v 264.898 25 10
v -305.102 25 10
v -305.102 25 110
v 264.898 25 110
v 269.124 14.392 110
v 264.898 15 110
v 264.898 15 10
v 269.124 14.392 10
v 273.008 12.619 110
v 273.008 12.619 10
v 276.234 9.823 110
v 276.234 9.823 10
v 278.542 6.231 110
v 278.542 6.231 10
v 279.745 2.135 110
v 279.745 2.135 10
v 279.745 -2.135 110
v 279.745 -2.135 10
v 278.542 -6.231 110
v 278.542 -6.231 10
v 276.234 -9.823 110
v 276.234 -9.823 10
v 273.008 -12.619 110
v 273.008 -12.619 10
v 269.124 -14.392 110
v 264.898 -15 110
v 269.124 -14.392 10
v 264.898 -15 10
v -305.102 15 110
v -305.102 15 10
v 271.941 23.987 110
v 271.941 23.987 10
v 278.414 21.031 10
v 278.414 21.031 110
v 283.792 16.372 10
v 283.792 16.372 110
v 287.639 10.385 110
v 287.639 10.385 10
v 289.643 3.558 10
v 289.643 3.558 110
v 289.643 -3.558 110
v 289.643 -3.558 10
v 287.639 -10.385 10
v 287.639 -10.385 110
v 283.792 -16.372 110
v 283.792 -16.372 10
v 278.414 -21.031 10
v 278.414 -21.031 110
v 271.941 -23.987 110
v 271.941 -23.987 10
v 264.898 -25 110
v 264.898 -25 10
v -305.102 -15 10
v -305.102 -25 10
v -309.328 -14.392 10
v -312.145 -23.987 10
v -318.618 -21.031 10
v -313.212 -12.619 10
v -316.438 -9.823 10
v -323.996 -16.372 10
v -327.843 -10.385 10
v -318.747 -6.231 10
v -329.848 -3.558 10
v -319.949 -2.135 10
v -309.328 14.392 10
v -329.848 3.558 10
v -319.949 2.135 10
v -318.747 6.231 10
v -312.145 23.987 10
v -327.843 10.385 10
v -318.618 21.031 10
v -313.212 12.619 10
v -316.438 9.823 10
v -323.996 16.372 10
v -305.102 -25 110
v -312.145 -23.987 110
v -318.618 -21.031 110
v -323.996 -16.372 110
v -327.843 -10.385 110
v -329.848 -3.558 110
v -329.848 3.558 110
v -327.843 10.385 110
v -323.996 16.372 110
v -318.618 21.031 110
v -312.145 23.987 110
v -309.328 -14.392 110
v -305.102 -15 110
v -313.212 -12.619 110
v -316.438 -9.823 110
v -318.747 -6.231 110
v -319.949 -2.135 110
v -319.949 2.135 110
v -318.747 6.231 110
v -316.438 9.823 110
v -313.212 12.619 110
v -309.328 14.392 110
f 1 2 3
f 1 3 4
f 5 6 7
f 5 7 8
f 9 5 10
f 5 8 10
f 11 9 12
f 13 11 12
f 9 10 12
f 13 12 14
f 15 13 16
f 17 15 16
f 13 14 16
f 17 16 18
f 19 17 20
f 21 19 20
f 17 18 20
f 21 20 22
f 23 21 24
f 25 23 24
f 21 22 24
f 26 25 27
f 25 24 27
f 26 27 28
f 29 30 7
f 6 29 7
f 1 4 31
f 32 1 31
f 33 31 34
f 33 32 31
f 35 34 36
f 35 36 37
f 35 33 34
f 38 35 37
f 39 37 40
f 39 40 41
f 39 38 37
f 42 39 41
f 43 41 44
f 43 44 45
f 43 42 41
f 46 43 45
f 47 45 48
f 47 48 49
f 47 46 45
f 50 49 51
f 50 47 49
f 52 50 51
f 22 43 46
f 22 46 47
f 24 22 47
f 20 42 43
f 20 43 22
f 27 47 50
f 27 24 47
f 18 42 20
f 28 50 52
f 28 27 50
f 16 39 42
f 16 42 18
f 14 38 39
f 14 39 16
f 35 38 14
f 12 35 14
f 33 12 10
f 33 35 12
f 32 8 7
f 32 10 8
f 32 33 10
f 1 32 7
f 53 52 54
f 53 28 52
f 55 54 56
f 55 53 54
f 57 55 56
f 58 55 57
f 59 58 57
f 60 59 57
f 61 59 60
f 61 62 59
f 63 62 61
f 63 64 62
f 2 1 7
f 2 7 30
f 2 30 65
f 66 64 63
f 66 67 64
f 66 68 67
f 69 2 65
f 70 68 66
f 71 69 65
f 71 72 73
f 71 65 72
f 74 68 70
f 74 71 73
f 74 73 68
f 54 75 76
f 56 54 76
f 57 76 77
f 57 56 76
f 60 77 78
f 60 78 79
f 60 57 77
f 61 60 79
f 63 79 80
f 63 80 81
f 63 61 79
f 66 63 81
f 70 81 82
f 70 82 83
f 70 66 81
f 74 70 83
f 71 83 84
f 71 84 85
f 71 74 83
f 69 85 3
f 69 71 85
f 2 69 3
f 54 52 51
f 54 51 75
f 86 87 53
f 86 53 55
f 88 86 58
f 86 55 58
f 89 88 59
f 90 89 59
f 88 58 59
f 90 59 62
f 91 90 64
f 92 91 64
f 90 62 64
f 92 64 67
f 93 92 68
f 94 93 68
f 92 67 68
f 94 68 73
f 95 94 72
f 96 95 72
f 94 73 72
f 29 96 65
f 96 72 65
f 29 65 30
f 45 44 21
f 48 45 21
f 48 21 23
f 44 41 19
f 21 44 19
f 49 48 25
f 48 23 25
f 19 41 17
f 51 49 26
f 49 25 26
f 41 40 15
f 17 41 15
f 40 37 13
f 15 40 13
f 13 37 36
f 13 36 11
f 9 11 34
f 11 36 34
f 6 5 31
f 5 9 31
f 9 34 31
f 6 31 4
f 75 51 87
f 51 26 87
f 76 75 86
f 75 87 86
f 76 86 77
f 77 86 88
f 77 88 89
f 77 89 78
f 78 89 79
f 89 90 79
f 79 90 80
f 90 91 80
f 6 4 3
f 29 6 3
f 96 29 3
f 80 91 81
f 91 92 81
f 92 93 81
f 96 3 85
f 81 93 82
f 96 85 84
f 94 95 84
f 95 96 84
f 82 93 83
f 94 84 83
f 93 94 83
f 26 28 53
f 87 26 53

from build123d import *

# Parameters (mm, degrees)
EXTRUDE_THIN1_START = 10
EXTRUDE_THIN1_DEPTH = 100


with BuildPart() as part:
    # Sketch1 → Extrude-Thin1 (new body)
    with BuildSketch(Plane.XY.offset(EXTRUDE_THIN1_START)):
        with BuildLine():
            Line((264.897959184, -25), (-305.102040816, -25))
            ThreePointArc((-305.102040816, -25), (-330.102040816, 0), (-305.102040816, 25))
            Line((-305.102040816, 25), (264.897959184, 25))
            ThreePointArc((264.897959184, 25), (289.897959184, 0), (264.897959184, -25))
        make_face()
        with BuildLine():
            Line((264.897959184, -15), (-305.102040816, -15))
            ThreePointArc((-305.102040816, -15), (-320.102040816, 0), (-305.102040816, 15))
            Line((-305.102040816, 15), (264.897959184, 15))
            ThreePointArc((264.897959184, 15), (279.897959184, 0), (264.897959184, -15))
        make_face(mode=Mode.SUBTRACT)
    extrude(amount=EXTRUDE_THIN1_DEPTH)


solid = part.part
